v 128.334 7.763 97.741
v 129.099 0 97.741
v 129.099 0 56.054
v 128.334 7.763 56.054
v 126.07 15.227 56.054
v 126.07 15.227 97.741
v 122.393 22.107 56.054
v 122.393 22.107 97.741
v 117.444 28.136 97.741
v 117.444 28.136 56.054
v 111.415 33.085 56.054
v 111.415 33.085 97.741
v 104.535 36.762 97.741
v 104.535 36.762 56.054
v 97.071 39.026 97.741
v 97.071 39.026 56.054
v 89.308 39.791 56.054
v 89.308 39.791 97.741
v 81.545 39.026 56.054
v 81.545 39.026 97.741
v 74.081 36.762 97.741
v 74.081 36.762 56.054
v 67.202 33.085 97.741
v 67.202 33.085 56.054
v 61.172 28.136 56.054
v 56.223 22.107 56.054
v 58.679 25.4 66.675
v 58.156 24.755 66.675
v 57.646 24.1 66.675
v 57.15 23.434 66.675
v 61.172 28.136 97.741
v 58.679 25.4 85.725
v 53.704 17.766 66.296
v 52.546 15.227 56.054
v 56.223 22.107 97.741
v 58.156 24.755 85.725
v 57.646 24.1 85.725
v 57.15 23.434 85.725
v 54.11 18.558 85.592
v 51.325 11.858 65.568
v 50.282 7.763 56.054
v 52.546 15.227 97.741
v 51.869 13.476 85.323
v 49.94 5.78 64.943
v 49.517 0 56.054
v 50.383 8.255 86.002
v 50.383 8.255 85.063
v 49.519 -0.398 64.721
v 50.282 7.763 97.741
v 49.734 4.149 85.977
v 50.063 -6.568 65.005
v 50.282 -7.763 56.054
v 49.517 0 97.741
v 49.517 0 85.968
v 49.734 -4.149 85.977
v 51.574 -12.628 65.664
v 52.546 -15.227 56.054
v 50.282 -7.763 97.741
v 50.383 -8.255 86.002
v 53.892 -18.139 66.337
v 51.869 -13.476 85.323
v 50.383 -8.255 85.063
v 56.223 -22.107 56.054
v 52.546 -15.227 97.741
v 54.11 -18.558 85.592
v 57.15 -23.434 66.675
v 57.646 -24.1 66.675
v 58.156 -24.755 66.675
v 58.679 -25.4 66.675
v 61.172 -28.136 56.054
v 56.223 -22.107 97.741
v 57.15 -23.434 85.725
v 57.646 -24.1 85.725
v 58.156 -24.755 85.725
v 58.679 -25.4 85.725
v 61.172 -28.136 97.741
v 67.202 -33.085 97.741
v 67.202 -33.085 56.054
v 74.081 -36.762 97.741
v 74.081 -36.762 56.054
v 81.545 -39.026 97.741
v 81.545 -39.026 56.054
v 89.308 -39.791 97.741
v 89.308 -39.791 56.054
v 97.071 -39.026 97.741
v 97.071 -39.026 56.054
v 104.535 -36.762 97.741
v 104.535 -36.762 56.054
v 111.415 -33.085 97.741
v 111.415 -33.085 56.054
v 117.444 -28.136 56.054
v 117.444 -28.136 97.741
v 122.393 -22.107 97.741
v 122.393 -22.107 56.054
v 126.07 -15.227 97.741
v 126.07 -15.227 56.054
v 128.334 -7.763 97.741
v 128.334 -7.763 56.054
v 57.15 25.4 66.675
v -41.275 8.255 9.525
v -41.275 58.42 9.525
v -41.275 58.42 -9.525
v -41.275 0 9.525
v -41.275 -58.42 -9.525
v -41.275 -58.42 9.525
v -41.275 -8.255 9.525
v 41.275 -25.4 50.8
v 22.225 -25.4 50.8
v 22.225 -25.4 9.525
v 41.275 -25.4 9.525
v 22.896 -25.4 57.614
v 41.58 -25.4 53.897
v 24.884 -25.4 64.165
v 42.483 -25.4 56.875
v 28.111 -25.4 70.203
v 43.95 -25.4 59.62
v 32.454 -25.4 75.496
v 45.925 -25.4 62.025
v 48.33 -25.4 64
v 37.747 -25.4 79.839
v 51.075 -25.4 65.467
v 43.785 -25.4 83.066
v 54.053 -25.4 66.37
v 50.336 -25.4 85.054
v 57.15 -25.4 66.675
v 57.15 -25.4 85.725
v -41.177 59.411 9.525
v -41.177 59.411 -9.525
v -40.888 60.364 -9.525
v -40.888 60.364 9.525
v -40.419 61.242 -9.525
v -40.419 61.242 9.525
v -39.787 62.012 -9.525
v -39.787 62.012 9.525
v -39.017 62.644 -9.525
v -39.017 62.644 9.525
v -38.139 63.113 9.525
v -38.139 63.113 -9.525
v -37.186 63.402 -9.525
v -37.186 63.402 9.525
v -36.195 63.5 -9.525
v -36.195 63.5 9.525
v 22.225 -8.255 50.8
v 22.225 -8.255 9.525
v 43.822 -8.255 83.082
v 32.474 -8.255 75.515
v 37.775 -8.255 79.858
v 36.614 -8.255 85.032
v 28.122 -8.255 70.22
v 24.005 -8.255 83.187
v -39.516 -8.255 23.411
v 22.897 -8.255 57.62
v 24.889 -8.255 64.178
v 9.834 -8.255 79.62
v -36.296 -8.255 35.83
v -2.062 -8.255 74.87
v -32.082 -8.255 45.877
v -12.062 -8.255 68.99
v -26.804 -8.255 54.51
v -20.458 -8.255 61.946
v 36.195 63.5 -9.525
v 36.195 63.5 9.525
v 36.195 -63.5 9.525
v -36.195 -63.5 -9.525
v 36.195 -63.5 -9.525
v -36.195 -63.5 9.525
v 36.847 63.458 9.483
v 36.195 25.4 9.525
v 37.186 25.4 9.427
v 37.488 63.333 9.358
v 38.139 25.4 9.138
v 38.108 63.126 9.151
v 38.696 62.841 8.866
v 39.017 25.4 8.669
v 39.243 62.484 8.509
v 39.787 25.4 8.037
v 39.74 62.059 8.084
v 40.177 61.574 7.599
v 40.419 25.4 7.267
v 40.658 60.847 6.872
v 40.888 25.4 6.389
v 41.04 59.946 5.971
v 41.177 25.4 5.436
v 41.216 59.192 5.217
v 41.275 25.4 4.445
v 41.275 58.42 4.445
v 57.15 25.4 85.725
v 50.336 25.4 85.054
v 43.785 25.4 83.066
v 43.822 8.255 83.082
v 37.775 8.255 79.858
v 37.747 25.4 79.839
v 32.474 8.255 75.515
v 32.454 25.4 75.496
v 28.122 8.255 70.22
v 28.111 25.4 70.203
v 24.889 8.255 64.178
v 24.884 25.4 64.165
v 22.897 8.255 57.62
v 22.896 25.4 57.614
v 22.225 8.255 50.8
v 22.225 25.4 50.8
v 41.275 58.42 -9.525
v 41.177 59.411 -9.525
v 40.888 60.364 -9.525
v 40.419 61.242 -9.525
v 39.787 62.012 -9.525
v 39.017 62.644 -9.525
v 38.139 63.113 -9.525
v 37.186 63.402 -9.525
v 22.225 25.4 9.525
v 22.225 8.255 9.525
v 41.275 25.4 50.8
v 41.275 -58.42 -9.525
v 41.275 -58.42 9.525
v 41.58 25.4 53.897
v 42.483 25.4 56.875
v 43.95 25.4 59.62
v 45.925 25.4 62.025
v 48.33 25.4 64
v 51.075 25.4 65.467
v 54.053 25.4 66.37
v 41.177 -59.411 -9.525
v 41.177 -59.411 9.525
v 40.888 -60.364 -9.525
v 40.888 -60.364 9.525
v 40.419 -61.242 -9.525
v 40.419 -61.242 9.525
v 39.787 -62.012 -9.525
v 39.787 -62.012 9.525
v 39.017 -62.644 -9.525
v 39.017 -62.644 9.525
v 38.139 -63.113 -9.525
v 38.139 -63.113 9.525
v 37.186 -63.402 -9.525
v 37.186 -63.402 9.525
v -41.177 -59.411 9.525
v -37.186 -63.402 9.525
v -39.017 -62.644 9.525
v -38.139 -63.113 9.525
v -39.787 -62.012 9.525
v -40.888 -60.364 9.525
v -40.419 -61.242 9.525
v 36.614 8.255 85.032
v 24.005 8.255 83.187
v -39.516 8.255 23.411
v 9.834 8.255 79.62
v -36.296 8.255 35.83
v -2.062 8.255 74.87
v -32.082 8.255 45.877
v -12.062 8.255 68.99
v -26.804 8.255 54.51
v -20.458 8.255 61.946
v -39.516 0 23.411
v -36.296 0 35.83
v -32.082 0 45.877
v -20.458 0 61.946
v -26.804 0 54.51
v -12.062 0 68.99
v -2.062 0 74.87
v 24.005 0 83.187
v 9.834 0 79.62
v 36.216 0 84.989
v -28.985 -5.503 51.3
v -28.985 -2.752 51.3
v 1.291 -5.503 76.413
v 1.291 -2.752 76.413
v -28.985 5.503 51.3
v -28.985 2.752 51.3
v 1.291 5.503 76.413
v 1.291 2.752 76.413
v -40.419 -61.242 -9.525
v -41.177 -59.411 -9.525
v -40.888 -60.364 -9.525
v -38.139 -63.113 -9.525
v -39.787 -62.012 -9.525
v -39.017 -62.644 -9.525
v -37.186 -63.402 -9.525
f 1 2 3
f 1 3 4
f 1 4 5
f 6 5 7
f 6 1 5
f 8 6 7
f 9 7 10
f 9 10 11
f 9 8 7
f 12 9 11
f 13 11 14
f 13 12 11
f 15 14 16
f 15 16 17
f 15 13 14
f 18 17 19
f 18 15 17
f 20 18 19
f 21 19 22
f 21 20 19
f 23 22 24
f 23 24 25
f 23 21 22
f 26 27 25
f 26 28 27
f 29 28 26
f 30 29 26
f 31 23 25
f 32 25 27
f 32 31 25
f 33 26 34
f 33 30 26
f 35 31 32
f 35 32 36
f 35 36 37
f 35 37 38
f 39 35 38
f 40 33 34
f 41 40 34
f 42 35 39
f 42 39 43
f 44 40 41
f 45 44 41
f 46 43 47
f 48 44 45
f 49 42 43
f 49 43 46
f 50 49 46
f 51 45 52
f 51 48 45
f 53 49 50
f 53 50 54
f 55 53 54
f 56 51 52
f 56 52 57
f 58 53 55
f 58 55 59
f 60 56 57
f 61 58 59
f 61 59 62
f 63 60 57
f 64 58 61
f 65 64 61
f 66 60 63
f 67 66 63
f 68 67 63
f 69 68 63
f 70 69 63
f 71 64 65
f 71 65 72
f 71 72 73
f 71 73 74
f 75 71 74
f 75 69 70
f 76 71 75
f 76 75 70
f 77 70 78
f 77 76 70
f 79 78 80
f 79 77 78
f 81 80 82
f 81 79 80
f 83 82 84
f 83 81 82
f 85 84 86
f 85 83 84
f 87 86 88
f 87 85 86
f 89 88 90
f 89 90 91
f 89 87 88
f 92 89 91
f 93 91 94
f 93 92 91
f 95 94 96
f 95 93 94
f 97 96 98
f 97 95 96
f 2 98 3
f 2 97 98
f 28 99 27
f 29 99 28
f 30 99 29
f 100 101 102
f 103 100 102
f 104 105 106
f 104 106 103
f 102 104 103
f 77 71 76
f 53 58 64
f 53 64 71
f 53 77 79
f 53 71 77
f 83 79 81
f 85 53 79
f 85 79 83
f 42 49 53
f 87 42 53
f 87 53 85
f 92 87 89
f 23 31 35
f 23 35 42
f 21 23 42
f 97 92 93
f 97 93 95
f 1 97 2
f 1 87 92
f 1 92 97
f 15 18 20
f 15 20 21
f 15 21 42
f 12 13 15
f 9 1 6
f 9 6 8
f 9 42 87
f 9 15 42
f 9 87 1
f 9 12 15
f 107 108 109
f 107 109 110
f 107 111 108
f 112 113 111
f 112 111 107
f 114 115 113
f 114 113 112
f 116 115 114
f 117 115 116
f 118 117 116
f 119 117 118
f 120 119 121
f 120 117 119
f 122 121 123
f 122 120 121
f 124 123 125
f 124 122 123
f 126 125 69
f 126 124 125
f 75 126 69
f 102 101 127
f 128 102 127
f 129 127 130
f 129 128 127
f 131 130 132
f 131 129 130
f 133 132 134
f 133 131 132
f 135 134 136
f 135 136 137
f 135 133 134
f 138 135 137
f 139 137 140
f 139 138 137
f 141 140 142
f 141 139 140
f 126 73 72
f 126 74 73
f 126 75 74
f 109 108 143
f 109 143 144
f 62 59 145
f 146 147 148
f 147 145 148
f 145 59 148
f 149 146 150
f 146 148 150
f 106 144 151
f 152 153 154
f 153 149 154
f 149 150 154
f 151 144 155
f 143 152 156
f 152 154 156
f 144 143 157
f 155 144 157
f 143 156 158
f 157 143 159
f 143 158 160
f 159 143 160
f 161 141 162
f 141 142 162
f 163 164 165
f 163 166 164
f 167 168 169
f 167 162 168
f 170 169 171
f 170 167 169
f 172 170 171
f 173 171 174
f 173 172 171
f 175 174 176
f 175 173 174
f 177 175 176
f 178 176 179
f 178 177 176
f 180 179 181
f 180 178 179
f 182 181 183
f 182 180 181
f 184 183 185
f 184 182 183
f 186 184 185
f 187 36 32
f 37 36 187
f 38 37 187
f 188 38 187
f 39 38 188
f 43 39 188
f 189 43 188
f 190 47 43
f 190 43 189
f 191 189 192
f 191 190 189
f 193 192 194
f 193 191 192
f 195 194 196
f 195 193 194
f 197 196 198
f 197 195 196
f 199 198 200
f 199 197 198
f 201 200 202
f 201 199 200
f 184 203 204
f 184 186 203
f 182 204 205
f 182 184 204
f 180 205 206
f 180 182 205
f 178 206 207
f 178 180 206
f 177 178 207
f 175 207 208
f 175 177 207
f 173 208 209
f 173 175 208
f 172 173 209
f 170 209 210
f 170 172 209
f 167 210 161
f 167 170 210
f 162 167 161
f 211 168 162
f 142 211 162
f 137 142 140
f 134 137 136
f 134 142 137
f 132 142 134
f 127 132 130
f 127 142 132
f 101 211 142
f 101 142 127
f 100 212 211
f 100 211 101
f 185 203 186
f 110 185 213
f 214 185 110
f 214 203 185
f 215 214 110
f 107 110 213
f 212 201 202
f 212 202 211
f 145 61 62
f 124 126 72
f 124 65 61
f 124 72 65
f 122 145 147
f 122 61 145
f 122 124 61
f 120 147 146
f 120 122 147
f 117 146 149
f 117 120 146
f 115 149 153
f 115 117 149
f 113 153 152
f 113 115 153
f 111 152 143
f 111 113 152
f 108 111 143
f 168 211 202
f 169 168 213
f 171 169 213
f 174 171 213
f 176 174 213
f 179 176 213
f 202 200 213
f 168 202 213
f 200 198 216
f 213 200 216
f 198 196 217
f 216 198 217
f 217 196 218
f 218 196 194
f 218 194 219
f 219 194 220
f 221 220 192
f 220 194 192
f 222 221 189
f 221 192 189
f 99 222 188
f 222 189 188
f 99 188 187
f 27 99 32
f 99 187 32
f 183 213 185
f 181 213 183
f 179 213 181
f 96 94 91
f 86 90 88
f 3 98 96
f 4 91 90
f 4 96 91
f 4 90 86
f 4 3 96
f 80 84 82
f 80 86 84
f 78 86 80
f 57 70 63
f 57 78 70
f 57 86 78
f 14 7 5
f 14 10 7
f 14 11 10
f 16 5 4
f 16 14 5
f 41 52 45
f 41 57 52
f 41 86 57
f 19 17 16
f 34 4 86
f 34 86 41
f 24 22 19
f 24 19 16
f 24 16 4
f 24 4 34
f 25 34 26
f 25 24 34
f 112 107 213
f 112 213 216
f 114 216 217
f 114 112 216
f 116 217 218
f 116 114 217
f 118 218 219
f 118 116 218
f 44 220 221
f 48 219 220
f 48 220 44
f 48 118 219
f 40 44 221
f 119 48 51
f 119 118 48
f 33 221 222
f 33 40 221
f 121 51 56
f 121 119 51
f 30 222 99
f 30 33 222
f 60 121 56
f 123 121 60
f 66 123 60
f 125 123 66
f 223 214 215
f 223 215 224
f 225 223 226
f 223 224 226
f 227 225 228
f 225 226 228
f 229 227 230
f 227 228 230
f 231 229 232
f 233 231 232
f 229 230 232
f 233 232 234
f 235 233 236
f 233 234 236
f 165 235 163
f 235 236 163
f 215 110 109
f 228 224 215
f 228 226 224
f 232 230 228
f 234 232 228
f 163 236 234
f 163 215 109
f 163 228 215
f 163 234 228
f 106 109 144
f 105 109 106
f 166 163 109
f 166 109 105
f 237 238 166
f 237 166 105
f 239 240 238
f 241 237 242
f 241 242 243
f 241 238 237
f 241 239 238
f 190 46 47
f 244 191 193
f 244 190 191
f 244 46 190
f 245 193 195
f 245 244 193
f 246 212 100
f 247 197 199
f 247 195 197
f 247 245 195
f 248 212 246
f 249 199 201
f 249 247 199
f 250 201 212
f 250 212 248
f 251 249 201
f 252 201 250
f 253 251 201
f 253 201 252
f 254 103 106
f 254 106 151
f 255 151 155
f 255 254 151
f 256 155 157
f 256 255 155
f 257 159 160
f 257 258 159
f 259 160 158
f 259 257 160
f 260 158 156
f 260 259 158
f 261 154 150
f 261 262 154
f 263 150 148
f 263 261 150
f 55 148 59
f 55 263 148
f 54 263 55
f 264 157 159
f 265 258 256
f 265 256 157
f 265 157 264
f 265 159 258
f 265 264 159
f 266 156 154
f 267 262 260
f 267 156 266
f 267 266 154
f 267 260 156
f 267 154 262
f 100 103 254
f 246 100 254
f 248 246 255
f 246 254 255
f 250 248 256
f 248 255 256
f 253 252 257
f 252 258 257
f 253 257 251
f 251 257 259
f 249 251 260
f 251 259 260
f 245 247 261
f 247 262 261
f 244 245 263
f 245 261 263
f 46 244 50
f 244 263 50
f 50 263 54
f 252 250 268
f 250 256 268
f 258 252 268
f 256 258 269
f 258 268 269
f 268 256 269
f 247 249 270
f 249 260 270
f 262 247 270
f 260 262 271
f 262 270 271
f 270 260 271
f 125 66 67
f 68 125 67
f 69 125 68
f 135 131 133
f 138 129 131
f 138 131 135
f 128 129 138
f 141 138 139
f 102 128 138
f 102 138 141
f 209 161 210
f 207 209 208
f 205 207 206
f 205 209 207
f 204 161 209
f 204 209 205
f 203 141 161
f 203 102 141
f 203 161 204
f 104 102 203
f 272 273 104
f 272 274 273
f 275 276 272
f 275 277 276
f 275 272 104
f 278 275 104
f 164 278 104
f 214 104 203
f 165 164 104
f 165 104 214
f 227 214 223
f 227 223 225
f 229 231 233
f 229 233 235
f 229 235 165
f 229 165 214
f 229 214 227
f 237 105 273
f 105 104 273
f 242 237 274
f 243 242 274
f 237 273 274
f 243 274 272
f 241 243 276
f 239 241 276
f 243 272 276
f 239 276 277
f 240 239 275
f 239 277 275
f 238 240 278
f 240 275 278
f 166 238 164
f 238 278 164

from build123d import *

# Parameters (mm, degrees)
F1_DEPTH = 63.5
F0_W     = 13.4667371243
F0_H     = 19.05
F2_DEPTH = 25.4
F3_DEPTH = 8.255
F5_R     = 5.08


with BuildPart() as f1:
    # F0 (on Front) → F1 (new body, symmetric)
    with BuildSketch(Plane.XZ):
        Polygon((-41.275, 9.525), (-41.275, -9.525), (41.275, -9.525), (41.275, 9.525), (22.225, 9.525), align=None)
    extrude(amount=F1_DEPTH, both=True)

    # F0 (on Front) → F2 (join, symmetric)
    with BuildSketch(Plane.XZ):
        with BuildLine():
            Line((22.225, 9.525), (41.275, 9.525))
            Line((41.275, 9.525), (41.275, 50.8))
            ThreePointArc((41.275, 50.8), (45.9246798487, 62.0253201513), (57.15, 66.675))
            Line((57.15, 66.675), (75.8414548727, 66.675))
            Line((75.8414548727, 66.675), (75.8414548727, 85.725))
            Line((75.8414548727, 85.725), (57.15, 85.725))
            ThreePointArc((57.15, 85.725), (32.4542956671, 75.4957043329), (22.225, 50.8))
            Line((22.225, 50.8), (22.225, 9.525))
        make_face()
        with Locations((82.5748234349, 76.2)):
            Rectangle(F0_W, F0_H)
    extrude(amount=F2_DEPTH, both=True)

    # F0 (on Front) → F3 (join, symmetric)
    with BuildSketch(Plane.XZ):
        with BuildLine():
            add(Edge.make_bspline(
                [(-41.275, 9.525), (-37.2192449868, 66.8318197131), (0, 89.7414088249), (75.8414548727, 85.725)],
                knots=[0, 0, 0, 0, 139.7236701563, 139.7236701563, 139.7236701563, 139.7236701563], degree=3))
            Line((-41.275, 9.525), (22.225, 9.525))
            Line((22.225, 9.525), (22.225, 50.8))
            ThreePointArc((22.225, 50.8), (32.4542956671, 75.4957043329), (57.15, 85.725))
            Line((57.15, 85.725), (75.8414548727, 85.725))
        make_face()
    extrude(amount=F3_DEPTH, both=True)

    # F0 (on Front) → F4 (revolve)
    with BuildSketch(Plane.XZ):
        Polygon((89.308191997, 97.7408438921), (89.308191997, 85.725), (89.308191997, 66.675), (89.308191997, 56.0535416007), (129.0989220142, 56.0535416007), (129.0989220142, 97.7408438921), align=None)
    revolve(axis=Axis((89.308191997, 0, 76.8971927464), (0, 0, 1)))

    # F5
    f5_edges = [f1.edges().sort_by_distance(p)[0] for p in [
        (41.275, 44.45, 9.525),
        (-41.275, 63.5, 0),
        (-41.275, -63.5, 0),
        (41.275, 63.5, 0),
        (41.275, -63.5, 0),
    ]]
    fillet(f5_edges, radius=F5_R)


solid = f1.part
